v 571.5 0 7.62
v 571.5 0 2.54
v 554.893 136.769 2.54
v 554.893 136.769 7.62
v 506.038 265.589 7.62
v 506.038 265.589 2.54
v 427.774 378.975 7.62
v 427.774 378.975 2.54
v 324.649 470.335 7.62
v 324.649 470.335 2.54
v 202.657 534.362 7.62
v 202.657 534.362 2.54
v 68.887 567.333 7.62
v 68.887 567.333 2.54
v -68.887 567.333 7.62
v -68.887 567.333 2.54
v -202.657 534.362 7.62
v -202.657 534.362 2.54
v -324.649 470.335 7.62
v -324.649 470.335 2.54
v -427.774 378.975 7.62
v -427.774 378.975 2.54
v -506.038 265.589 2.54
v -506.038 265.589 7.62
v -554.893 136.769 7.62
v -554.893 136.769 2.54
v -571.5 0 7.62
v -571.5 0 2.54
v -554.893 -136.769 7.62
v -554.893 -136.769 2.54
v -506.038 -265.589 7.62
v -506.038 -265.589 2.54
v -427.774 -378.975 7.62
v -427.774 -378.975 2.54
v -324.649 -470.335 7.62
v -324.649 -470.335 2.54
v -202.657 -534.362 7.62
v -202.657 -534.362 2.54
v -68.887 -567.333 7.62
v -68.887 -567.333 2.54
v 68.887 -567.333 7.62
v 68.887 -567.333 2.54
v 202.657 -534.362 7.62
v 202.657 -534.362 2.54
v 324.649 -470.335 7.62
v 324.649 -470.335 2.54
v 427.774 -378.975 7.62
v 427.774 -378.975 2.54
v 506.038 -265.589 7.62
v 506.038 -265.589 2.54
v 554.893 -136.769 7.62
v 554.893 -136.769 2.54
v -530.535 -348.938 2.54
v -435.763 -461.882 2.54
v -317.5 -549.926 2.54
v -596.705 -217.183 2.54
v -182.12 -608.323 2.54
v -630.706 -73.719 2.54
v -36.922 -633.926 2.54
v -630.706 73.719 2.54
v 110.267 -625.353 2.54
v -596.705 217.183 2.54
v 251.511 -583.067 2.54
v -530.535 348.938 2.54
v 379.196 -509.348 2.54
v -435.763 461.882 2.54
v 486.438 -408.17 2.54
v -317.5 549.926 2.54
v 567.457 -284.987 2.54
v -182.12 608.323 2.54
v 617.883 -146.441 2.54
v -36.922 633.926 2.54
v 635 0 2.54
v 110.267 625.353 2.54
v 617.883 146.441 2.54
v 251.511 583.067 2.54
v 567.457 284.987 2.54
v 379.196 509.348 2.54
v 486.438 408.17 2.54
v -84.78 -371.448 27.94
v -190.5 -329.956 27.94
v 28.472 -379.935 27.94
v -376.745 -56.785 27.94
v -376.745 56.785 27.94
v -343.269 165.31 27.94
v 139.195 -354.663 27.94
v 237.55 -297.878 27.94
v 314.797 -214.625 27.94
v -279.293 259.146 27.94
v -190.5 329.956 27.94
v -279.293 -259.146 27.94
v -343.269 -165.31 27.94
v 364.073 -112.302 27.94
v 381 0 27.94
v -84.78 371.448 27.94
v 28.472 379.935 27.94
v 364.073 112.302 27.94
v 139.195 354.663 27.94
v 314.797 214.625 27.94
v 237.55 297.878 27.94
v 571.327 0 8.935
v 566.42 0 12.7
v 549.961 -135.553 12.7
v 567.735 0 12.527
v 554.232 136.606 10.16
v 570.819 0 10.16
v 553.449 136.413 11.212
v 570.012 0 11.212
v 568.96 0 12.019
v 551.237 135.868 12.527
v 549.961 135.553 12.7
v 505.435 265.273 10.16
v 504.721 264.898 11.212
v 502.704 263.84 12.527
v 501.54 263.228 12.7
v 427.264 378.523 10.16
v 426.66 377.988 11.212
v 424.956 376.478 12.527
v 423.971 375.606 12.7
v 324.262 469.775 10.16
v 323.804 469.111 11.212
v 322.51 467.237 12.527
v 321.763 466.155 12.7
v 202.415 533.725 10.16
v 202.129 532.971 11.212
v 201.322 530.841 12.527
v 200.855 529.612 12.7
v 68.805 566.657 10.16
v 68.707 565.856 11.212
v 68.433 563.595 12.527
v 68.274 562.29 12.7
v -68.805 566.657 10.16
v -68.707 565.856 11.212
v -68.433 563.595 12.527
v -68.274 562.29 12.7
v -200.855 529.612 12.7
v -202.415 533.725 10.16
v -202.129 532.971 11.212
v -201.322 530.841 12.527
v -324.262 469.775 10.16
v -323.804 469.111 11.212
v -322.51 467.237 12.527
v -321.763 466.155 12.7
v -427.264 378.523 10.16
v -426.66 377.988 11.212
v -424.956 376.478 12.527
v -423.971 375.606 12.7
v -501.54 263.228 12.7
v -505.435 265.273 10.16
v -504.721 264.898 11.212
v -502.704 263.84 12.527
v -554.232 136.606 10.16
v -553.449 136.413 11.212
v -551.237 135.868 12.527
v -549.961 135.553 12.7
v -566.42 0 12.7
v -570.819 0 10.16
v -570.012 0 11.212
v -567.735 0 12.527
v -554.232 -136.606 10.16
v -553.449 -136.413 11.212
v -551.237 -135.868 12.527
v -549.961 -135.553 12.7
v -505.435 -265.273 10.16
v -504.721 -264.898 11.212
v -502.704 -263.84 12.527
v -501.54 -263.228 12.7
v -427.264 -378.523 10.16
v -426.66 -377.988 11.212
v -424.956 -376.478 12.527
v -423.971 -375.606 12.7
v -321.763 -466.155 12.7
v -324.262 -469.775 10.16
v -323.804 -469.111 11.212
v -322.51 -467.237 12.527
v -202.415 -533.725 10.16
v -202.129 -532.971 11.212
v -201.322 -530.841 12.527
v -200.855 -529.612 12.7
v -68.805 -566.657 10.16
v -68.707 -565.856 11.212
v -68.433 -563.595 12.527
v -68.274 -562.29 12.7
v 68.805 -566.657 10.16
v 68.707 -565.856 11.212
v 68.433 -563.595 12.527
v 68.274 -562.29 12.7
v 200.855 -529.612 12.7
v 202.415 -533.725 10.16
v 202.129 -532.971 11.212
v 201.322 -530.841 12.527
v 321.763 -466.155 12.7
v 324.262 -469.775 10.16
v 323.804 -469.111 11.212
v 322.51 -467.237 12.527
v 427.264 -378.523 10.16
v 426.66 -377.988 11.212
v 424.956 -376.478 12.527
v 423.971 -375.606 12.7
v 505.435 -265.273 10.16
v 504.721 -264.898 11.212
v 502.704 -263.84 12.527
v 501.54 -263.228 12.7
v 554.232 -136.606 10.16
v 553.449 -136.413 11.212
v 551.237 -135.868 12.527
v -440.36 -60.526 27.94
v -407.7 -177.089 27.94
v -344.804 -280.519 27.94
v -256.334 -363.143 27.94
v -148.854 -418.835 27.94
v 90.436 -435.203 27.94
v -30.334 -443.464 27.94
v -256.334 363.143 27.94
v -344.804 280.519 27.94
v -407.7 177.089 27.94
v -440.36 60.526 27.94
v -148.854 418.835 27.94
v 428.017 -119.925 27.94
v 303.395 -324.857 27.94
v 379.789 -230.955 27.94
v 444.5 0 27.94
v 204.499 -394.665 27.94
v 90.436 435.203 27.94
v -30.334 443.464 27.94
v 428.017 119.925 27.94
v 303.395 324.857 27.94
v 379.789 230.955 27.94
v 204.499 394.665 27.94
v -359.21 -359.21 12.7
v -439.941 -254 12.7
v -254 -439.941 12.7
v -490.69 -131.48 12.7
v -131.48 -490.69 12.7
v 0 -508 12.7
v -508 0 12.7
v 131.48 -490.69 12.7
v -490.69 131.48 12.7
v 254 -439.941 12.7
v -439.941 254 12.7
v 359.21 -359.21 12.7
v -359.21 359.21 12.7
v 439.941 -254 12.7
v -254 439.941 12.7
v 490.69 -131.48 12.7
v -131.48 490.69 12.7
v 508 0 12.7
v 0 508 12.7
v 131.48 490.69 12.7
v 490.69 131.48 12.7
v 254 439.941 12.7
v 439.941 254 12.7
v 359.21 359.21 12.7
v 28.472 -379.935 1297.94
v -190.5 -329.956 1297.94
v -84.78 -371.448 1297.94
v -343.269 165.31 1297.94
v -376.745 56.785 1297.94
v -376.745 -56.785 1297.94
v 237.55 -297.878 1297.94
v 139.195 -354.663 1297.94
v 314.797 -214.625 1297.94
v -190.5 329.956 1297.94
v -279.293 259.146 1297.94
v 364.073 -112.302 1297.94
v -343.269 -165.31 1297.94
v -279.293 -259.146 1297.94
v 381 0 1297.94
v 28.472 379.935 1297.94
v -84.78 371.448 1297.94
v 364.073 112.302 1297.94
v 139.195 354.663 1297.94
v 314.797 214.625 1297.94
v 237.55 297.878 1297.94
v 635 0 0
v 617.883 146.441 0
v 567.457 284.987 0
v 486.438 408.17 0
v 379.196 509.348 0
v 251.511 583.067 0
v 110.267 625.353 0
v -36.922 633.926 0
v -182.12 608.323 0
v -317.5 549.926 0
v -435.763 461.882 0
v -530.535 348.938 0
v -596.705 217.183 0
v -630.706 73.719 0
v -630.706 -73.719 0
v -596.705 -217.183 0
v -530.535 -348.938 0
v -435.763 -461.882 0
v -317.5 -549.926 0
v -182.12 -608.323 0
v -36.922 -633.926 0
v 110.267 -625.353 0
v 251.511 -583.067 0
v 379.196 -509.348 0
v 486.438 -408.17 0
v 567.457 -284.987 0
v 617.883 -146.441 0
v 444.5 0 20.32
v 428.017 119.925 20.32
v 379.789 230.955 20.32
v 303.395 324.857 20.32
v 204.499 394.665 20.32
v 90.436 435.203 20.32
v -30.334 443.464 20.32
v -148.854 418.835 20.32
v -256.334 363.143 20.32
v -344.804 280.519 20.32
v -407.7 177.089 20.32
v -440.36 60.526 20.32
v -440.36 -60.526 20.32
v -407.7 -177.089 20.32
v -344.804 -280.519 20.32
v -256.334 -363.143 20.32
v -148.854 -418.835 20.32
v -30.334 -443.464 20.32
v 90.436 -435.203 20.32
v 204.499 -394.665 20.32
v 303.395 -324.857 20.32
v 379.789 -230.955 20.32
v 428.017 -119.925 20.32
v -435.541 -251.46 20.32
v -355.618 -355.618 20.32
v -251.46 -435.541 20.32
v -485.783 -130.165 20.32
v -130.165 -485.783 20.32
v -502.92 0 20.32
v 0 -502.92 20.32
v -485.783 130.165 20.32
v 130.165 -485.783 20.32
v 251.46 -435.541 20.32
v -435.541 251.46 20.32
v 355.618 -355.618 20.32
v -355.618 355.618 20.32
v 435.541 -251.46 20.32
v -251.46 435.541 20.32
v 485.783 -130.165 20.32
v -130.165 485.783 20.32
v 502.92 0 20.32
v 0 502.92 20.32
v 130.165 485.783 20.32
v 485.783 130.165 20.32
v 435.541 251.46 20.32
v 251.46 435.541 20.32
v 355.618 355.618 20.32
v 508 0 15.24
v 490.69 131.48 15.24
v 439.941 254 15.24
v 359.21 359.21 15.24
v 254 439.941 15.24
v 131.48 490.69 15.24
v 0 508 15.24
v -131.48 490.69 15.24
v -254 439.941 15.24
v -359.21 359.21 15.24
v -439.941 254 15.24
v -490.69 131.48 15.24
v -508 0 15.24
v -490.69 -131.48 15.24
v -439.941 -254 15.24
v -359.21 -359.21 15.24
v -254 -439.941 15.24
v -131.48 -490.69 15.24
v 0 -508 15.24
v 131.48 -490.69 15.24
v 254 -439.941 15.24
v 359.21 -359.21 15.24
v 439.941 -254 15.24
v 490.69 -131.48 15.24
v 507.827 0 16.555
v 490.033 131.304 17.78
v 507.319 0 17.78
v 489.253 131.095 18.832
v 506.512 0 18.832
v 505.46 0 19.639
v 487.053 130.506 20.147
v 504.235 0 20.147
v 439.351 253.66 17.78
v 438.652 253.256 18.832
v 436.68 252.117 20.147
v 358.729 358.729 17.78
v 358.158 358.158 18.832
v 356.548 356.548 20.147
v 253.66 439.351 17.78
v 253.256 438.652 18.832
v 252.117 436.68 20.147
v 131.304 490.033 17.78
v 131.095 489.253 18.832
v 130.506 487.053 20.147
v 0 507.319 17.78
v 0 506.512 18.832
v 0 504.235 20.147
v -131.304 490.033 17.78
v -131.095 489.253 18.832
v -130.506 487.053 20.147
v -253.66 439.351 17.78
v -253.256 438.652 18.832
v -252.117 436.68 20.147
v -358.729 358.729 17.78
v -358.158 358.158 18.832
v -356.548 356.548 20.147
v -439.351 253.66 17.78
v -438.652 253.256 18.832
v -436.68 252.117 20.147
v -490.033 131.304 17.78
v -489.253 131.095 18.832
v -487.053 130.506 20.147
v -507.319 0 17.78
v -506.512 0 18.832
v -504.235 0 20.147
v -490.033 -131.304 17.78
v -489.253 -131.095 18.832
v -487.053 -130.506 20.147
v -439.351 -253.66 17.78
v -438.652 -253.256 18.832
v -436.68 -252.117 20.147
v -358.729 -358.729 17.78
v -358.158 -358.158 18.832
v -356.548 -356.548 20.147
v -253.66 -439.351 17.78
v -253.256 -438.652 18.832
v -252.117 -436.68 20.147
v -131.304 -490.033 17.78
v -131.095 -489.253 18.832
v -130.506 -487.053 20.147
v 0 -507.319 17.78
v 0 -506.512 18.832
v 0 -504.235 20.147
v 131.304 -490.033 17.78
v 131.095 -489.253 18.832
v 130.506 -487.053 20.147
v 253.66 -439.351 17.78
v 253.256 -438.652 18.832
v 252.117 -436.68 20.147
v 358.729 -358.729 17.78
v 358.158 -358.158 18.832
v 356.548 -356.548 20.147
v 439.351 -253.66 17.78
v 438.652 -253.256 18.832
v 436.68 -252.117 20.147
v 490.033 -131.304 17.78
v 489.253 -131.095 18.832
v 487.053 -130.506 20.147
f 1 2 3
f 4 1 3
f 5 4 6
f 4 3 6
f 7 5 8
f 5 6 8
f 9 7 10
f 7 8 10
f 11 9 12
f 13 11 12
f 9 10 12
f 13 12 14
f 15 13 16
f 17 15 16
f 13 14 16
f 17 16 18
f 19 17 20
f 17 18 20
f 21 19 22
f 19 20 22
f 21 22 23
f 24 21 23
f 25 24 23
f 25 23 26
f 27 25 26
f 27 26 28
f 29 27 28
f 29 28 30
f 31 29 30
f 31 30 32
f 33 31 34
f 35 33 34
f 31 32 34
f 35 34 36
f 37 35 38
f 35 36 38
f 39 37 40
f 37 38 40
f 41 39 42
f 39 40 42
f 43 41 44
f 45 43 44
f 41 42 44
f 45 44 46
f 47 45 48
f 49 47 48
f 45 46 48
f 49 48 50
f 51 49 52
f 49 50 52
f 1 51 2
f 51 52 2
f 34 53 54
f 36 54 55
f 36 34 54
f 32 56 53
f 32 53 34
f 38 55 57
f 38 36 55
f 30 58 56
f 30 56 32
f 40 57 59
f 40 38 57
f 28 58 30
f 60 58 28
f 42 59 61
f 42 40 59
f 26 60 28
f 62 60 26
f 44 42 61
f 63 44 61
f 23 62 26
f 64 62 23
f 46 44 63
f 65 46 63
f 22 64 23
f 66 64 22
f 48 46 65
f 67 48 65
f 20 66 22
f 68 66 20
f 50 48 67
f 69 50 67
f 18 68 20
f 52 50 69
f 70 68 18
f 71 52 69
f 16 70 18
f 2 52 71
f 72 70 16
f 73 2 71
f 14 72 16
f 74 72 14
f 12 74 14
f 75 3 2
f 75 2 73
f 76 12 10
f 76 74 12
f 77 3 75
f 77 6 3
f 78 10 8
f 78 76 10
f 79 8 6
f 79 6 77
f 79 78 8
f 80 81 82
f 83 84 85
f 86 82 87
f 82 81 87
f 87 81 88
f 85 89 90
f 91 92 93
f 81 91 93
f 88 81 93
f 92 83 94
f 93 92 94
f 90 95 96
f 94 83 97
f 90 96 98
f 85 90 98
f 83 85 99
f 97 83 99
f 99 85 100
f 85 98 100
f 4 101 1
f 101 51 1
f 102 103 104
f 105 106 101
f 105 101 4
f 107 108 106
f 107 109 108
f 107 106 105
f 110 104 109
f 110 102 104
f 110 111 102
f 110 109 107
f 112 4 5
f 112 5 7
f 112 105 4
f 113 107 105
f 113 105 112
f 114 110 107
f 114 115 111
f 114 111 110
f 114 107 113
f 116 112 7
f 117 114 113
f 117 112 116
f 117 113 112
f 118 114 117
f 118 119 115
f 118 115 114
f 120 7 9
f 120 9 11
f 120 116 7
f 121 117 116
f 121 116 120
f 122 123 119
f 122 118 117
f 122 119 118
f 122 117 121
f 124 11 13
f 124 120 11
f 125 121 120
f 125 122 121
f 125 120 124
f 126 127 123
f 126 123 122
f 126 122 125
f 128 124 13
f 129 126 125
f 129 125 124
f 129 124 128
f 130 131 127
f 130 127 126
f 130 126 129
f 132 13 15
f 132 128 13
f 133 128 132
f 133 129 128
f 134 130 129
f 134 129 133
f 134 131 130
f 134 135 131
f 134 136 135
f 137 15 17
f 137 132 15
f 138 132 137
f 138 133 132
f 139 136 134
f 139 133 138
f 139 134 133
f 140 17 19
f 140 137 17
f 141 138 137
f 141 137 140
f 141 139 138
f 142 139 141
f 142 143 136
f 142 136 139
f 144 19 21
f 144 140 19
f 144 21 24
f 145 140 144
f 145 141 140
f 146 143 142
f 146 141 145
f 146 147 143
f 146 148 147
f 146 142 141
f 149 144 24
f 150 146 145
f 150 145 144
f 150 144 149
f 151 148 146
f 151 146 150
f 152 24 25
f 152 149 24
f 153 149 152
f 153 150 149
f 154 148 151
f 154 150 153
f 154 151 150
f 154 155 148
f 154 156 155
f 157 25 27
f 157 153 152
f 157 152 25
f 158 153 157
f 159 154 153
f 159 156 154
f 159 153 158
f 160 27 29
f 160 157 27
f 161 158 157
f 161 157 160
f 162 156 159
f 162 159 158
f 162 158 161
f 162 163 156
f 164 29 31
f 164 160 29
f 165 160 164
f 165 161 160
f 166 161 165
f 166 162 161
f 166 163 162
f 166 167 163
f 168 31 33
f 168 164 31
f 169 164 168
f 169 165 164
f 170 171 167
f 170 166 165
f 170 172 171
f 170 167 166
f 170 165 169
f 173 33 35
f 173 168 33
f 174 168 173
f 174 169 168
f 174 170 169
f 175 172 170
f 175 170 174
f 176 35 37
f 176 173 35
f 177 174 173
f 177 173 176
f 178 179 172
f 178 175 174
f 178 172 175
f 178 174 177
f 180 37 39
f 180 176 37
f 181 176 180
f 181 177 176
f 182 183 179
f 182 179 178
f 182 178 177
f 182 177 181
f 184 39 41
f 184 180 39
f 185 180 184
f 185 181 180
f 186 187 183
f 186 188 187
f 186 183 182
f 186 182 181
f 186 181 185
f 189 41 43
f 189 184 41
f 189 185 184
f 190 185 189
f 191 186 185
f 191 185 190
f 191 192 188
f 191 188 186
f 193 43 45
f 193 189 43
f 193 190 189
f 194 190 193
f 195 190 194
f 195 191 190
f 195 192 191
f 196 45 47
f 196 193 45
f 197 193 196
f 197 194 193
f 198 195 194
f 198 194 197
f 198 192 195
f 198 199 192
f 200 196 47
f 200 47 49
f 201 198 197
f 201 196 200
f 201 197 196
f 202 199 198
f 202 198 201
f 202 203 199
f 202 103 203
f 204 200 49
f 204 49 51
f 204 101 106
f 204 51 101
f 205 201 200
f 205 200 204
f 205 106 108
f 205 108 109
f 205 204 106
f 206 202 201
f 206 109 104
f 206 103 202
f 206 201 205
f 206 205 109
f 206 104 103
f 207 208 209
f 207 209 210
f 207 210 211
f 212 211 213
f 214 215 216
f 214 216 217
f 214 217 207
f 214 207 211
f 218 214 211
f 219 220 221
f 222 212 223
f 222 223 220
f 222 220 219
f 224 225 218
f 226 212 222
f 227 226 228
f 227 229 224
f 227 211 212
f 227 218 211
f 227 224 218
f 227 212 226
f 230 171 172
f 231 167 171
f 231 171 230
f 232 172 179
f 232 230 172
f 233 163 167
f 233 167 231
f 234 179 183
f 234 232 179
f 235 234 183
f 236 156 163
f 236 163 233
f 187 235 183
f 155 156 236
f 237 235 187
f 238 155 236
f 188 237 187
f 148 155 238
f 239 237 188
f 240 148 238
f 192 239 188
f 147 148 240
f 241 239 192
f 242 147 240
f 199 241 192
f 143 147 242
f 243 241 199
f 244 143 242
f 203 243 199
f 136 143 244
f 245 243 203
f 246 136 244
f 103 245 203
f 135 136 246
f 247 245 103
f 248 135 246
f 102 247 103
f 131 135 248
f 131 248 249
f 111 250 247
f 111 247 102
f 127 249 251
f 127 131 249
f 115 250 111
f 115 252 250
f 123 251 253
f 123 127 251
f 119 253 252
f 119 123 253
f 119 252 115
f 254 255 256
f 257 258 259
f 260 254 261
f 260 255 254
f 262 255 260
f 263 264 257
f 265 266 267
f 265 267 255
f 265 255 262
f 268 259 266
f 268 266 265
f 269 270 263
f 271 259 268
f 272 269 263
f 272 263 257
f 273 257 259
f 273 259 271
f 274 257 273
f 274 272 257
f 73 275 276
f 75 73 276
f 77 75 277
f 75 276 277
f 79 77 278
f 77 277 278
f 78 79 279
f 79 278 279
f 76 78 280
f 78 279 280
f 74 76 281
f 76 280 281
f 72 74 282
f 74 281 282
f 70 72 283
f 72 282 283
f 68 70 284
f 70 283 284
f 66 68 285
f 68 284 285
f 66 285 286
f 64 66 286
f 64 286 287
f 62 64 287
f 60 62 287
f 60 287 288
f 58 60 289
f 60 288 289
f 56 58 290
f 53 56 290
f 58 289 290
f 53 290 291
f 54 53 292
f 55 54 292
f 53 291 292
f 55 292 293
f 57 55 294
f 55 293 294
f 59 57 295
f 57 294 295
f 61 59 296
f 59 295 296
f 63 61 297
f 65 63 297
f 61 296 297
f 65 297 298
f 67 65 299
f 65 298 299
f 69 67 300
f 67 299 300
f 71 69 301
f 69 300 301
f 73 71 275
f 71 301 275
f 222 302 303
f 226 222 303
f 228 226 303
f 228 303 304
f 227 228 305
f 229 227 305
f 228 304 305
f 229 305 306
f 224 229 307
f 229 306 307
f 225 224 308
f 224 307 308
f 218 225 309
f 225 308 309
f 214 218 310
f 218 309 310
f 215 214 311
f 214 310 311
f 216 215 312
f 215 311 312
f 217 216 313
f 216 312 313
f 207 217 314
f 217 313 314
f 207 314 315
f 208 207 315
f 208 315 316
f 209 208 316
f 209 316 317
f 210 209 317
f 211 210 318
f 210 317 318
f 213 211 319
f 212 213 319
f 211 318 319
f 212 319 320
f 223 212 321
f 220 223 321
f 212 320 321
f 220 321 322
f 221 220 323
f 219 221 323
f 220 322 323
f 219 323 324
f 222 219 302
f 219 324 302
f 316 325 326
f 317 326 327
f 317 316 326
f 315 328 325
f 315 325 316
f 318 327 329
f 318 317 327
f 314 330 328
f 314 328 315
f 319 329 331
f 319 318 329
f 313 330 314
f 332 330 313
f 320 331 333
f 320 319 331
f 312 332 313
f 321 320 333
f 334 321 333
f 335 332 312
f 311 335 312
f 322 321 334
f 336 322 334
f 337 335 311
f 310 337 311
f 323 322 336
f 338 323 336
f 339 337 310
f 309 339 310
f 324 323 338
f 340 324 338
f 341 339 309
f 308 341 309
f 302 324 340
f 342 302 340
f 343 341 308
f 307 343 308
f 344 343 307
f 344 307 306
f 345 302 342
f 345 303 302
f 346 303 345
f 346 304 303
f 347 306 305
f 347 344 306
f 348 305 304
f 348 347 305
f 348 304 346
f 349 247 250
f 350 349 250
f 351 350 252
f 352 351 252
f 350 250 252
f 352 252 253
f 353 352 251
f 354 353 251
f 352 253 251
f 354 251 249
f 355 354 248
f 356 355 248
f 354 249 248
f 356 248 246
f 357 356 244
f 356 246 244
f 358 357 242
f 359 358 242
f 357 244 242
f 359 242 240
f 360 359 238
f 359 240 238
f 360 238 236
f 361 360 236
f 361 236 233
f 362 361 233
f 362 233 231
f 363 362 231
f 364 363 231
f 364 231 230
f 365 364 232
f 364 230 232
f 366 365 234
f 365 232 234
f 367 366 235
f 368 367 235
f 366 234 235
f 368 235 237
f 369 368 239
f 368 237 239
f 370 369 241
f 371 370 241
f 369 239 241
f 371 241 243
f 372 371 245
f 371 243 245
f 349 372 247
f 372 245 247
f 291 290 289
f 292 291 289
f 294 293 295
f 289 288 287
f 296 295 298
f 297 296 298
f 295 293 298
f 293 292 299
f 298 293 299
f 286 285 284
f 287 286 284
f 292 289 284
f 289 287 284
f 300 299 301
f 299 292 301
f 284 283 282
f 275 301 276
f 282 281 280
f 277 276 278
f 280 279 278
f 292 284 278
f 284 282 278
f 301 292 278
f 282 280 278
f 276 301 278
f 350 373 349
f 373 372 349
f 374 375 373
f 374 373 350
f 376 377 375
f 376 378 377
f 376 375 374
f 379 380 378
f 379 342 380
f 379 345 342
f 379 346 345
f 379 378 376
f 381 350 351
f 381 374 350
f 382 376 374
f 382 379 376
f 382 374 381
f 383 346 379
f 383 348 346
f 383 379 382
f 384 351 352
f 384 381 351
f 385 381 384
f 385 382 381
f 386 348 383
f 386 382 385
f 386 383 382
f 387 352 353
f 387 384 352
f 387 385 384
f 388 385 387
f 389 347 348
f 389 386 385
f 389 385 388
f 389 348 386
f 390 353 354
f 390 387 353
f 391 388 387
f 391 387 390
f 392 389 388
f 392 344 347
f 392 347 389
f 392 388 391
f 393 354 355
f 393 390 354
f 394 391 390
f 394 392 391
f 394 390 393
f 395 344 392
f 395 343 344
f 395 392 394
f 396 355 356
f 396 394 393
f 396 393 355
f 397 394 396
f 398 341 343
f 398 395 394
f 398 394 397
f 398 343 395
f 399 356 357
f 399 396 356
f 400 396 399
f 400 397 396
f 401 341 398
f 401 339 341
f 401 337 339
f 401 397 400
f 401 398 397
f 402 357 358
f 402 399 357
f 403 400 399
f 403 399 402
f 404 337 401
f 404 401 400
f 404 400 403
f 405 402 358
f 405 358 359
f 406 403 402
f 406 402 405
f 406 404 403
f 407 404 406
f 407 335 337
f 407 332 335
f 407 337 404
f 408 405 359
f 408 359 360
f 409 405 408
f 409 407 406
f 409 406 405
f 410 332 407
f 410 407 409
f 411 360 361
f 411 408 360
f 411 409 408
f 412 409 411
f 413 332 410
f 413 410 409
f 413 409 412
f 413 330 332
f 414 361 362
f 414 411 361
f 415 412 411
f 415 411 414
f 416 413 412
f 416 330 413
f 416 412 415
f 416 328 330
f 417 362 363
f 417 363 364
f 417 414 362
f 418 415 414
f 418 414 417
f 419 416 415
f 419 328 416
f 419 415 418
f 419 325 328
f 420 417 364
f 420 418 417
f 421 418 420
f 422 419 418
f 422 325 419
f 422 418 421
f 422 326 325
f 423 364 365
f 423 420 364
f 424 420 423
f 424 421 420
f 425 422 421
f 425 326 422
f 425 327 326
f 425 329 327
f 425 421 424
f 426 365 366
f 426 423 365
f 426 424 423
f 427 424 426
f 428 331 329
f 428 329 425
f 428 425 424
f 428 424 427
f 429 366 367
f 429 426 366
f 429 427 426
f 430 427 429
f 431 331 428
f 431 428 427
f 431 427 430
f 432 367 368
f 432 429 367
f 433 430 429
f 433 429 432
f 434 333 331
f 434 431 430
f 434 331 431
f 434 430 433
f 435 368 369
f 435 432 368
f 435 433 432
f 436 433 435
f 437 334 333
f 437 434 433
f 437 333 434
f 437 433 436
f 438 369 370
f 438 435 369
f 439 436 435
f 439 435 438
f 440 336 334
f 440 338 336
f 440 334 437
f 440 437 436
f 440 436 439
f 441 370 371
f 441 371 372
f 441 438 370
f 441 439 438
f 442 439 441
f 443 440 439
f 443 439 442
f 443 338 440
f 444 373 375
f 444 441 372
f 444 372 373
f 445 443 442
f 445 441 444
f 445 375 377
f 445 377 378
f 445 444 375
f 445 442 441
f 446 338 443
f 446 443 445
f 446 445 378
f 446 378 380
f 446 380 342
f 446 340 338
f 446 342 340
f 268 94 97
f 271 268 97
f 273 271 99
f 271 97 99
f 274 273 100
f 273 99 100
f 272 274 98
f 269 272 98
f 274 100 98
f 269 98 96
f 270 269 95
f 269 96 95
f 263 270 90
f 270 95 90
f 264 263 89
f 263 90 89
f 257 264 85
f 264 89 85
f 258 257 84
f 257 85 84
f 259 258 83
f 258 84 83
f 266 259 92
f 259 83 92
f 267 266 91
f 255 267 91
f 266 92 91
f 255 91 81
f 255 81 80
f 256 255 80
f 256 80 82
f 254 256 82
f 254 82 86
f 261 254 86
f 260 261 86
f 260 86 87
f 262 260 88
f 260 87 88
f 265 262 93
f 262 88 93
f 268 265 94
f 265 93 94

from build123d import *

# Parameters (mm, degrees)
F0_R      = 635
F1_DEPTH  = 2.54
F2_R      = 571.5
F3_DEPTH  = 10.16
F4_R      = 5.08
F5_R      = 508
F6_DEPTH  = 7.62
F7_R      = 5.08
F8_R      = 444.5
F9_DEPTH  = 7.62
F10_R     = 381
F11_DEPTH = 1270


with BuildPart() as f1:
    # F0 (on Top) → F1 (new body)
    with BuildSketch(Plane.XY):
        Circle(F0_R)
    extrude(amount=F1_DEPTH)

    # F2 (on face) → F3 (join)
    with BuildSketch(Plane.XY.offset(2.54)):
        Circle(F2_R)
    extrude(amount=F3_DEPTH)

    # F4
    f4_edges = [f1.edges().sort_by_distance(p)[0] for p in [
        (-571.5, 0, 12.7),
    ]]
    fillet(f4_edges, radius=F4_R)

    # F5 (on face) → F6 (join)
    with BuildSketch(Plane.XY.offset(12.7)):
        Circle(F5_R)
    extrude(amount=F6_DEPTH)

    # F7
    f7_edges = [f1.edges().sort_by_distance(p)[0] for p in [
        (-508, 0, 20.32),
    ]]
    fillet(f7_edges, radius=F7_R)

    # F8 (on face) → F9 (join)
    with BuildSketch(Plane.XY.offset(20.32)):
        Circle(F8_R)
    extrude(amount=F9_DEPTH)


with BuildPart() as f11:
    # F10 (on face) → F11 (new body)
    with BuildSketch(Plane.XY.offset(27.94)):
        Circle(F10_R)
    extrude(amount=F11_DEPTH)


solid = Compound([f1.part, f11.part])
